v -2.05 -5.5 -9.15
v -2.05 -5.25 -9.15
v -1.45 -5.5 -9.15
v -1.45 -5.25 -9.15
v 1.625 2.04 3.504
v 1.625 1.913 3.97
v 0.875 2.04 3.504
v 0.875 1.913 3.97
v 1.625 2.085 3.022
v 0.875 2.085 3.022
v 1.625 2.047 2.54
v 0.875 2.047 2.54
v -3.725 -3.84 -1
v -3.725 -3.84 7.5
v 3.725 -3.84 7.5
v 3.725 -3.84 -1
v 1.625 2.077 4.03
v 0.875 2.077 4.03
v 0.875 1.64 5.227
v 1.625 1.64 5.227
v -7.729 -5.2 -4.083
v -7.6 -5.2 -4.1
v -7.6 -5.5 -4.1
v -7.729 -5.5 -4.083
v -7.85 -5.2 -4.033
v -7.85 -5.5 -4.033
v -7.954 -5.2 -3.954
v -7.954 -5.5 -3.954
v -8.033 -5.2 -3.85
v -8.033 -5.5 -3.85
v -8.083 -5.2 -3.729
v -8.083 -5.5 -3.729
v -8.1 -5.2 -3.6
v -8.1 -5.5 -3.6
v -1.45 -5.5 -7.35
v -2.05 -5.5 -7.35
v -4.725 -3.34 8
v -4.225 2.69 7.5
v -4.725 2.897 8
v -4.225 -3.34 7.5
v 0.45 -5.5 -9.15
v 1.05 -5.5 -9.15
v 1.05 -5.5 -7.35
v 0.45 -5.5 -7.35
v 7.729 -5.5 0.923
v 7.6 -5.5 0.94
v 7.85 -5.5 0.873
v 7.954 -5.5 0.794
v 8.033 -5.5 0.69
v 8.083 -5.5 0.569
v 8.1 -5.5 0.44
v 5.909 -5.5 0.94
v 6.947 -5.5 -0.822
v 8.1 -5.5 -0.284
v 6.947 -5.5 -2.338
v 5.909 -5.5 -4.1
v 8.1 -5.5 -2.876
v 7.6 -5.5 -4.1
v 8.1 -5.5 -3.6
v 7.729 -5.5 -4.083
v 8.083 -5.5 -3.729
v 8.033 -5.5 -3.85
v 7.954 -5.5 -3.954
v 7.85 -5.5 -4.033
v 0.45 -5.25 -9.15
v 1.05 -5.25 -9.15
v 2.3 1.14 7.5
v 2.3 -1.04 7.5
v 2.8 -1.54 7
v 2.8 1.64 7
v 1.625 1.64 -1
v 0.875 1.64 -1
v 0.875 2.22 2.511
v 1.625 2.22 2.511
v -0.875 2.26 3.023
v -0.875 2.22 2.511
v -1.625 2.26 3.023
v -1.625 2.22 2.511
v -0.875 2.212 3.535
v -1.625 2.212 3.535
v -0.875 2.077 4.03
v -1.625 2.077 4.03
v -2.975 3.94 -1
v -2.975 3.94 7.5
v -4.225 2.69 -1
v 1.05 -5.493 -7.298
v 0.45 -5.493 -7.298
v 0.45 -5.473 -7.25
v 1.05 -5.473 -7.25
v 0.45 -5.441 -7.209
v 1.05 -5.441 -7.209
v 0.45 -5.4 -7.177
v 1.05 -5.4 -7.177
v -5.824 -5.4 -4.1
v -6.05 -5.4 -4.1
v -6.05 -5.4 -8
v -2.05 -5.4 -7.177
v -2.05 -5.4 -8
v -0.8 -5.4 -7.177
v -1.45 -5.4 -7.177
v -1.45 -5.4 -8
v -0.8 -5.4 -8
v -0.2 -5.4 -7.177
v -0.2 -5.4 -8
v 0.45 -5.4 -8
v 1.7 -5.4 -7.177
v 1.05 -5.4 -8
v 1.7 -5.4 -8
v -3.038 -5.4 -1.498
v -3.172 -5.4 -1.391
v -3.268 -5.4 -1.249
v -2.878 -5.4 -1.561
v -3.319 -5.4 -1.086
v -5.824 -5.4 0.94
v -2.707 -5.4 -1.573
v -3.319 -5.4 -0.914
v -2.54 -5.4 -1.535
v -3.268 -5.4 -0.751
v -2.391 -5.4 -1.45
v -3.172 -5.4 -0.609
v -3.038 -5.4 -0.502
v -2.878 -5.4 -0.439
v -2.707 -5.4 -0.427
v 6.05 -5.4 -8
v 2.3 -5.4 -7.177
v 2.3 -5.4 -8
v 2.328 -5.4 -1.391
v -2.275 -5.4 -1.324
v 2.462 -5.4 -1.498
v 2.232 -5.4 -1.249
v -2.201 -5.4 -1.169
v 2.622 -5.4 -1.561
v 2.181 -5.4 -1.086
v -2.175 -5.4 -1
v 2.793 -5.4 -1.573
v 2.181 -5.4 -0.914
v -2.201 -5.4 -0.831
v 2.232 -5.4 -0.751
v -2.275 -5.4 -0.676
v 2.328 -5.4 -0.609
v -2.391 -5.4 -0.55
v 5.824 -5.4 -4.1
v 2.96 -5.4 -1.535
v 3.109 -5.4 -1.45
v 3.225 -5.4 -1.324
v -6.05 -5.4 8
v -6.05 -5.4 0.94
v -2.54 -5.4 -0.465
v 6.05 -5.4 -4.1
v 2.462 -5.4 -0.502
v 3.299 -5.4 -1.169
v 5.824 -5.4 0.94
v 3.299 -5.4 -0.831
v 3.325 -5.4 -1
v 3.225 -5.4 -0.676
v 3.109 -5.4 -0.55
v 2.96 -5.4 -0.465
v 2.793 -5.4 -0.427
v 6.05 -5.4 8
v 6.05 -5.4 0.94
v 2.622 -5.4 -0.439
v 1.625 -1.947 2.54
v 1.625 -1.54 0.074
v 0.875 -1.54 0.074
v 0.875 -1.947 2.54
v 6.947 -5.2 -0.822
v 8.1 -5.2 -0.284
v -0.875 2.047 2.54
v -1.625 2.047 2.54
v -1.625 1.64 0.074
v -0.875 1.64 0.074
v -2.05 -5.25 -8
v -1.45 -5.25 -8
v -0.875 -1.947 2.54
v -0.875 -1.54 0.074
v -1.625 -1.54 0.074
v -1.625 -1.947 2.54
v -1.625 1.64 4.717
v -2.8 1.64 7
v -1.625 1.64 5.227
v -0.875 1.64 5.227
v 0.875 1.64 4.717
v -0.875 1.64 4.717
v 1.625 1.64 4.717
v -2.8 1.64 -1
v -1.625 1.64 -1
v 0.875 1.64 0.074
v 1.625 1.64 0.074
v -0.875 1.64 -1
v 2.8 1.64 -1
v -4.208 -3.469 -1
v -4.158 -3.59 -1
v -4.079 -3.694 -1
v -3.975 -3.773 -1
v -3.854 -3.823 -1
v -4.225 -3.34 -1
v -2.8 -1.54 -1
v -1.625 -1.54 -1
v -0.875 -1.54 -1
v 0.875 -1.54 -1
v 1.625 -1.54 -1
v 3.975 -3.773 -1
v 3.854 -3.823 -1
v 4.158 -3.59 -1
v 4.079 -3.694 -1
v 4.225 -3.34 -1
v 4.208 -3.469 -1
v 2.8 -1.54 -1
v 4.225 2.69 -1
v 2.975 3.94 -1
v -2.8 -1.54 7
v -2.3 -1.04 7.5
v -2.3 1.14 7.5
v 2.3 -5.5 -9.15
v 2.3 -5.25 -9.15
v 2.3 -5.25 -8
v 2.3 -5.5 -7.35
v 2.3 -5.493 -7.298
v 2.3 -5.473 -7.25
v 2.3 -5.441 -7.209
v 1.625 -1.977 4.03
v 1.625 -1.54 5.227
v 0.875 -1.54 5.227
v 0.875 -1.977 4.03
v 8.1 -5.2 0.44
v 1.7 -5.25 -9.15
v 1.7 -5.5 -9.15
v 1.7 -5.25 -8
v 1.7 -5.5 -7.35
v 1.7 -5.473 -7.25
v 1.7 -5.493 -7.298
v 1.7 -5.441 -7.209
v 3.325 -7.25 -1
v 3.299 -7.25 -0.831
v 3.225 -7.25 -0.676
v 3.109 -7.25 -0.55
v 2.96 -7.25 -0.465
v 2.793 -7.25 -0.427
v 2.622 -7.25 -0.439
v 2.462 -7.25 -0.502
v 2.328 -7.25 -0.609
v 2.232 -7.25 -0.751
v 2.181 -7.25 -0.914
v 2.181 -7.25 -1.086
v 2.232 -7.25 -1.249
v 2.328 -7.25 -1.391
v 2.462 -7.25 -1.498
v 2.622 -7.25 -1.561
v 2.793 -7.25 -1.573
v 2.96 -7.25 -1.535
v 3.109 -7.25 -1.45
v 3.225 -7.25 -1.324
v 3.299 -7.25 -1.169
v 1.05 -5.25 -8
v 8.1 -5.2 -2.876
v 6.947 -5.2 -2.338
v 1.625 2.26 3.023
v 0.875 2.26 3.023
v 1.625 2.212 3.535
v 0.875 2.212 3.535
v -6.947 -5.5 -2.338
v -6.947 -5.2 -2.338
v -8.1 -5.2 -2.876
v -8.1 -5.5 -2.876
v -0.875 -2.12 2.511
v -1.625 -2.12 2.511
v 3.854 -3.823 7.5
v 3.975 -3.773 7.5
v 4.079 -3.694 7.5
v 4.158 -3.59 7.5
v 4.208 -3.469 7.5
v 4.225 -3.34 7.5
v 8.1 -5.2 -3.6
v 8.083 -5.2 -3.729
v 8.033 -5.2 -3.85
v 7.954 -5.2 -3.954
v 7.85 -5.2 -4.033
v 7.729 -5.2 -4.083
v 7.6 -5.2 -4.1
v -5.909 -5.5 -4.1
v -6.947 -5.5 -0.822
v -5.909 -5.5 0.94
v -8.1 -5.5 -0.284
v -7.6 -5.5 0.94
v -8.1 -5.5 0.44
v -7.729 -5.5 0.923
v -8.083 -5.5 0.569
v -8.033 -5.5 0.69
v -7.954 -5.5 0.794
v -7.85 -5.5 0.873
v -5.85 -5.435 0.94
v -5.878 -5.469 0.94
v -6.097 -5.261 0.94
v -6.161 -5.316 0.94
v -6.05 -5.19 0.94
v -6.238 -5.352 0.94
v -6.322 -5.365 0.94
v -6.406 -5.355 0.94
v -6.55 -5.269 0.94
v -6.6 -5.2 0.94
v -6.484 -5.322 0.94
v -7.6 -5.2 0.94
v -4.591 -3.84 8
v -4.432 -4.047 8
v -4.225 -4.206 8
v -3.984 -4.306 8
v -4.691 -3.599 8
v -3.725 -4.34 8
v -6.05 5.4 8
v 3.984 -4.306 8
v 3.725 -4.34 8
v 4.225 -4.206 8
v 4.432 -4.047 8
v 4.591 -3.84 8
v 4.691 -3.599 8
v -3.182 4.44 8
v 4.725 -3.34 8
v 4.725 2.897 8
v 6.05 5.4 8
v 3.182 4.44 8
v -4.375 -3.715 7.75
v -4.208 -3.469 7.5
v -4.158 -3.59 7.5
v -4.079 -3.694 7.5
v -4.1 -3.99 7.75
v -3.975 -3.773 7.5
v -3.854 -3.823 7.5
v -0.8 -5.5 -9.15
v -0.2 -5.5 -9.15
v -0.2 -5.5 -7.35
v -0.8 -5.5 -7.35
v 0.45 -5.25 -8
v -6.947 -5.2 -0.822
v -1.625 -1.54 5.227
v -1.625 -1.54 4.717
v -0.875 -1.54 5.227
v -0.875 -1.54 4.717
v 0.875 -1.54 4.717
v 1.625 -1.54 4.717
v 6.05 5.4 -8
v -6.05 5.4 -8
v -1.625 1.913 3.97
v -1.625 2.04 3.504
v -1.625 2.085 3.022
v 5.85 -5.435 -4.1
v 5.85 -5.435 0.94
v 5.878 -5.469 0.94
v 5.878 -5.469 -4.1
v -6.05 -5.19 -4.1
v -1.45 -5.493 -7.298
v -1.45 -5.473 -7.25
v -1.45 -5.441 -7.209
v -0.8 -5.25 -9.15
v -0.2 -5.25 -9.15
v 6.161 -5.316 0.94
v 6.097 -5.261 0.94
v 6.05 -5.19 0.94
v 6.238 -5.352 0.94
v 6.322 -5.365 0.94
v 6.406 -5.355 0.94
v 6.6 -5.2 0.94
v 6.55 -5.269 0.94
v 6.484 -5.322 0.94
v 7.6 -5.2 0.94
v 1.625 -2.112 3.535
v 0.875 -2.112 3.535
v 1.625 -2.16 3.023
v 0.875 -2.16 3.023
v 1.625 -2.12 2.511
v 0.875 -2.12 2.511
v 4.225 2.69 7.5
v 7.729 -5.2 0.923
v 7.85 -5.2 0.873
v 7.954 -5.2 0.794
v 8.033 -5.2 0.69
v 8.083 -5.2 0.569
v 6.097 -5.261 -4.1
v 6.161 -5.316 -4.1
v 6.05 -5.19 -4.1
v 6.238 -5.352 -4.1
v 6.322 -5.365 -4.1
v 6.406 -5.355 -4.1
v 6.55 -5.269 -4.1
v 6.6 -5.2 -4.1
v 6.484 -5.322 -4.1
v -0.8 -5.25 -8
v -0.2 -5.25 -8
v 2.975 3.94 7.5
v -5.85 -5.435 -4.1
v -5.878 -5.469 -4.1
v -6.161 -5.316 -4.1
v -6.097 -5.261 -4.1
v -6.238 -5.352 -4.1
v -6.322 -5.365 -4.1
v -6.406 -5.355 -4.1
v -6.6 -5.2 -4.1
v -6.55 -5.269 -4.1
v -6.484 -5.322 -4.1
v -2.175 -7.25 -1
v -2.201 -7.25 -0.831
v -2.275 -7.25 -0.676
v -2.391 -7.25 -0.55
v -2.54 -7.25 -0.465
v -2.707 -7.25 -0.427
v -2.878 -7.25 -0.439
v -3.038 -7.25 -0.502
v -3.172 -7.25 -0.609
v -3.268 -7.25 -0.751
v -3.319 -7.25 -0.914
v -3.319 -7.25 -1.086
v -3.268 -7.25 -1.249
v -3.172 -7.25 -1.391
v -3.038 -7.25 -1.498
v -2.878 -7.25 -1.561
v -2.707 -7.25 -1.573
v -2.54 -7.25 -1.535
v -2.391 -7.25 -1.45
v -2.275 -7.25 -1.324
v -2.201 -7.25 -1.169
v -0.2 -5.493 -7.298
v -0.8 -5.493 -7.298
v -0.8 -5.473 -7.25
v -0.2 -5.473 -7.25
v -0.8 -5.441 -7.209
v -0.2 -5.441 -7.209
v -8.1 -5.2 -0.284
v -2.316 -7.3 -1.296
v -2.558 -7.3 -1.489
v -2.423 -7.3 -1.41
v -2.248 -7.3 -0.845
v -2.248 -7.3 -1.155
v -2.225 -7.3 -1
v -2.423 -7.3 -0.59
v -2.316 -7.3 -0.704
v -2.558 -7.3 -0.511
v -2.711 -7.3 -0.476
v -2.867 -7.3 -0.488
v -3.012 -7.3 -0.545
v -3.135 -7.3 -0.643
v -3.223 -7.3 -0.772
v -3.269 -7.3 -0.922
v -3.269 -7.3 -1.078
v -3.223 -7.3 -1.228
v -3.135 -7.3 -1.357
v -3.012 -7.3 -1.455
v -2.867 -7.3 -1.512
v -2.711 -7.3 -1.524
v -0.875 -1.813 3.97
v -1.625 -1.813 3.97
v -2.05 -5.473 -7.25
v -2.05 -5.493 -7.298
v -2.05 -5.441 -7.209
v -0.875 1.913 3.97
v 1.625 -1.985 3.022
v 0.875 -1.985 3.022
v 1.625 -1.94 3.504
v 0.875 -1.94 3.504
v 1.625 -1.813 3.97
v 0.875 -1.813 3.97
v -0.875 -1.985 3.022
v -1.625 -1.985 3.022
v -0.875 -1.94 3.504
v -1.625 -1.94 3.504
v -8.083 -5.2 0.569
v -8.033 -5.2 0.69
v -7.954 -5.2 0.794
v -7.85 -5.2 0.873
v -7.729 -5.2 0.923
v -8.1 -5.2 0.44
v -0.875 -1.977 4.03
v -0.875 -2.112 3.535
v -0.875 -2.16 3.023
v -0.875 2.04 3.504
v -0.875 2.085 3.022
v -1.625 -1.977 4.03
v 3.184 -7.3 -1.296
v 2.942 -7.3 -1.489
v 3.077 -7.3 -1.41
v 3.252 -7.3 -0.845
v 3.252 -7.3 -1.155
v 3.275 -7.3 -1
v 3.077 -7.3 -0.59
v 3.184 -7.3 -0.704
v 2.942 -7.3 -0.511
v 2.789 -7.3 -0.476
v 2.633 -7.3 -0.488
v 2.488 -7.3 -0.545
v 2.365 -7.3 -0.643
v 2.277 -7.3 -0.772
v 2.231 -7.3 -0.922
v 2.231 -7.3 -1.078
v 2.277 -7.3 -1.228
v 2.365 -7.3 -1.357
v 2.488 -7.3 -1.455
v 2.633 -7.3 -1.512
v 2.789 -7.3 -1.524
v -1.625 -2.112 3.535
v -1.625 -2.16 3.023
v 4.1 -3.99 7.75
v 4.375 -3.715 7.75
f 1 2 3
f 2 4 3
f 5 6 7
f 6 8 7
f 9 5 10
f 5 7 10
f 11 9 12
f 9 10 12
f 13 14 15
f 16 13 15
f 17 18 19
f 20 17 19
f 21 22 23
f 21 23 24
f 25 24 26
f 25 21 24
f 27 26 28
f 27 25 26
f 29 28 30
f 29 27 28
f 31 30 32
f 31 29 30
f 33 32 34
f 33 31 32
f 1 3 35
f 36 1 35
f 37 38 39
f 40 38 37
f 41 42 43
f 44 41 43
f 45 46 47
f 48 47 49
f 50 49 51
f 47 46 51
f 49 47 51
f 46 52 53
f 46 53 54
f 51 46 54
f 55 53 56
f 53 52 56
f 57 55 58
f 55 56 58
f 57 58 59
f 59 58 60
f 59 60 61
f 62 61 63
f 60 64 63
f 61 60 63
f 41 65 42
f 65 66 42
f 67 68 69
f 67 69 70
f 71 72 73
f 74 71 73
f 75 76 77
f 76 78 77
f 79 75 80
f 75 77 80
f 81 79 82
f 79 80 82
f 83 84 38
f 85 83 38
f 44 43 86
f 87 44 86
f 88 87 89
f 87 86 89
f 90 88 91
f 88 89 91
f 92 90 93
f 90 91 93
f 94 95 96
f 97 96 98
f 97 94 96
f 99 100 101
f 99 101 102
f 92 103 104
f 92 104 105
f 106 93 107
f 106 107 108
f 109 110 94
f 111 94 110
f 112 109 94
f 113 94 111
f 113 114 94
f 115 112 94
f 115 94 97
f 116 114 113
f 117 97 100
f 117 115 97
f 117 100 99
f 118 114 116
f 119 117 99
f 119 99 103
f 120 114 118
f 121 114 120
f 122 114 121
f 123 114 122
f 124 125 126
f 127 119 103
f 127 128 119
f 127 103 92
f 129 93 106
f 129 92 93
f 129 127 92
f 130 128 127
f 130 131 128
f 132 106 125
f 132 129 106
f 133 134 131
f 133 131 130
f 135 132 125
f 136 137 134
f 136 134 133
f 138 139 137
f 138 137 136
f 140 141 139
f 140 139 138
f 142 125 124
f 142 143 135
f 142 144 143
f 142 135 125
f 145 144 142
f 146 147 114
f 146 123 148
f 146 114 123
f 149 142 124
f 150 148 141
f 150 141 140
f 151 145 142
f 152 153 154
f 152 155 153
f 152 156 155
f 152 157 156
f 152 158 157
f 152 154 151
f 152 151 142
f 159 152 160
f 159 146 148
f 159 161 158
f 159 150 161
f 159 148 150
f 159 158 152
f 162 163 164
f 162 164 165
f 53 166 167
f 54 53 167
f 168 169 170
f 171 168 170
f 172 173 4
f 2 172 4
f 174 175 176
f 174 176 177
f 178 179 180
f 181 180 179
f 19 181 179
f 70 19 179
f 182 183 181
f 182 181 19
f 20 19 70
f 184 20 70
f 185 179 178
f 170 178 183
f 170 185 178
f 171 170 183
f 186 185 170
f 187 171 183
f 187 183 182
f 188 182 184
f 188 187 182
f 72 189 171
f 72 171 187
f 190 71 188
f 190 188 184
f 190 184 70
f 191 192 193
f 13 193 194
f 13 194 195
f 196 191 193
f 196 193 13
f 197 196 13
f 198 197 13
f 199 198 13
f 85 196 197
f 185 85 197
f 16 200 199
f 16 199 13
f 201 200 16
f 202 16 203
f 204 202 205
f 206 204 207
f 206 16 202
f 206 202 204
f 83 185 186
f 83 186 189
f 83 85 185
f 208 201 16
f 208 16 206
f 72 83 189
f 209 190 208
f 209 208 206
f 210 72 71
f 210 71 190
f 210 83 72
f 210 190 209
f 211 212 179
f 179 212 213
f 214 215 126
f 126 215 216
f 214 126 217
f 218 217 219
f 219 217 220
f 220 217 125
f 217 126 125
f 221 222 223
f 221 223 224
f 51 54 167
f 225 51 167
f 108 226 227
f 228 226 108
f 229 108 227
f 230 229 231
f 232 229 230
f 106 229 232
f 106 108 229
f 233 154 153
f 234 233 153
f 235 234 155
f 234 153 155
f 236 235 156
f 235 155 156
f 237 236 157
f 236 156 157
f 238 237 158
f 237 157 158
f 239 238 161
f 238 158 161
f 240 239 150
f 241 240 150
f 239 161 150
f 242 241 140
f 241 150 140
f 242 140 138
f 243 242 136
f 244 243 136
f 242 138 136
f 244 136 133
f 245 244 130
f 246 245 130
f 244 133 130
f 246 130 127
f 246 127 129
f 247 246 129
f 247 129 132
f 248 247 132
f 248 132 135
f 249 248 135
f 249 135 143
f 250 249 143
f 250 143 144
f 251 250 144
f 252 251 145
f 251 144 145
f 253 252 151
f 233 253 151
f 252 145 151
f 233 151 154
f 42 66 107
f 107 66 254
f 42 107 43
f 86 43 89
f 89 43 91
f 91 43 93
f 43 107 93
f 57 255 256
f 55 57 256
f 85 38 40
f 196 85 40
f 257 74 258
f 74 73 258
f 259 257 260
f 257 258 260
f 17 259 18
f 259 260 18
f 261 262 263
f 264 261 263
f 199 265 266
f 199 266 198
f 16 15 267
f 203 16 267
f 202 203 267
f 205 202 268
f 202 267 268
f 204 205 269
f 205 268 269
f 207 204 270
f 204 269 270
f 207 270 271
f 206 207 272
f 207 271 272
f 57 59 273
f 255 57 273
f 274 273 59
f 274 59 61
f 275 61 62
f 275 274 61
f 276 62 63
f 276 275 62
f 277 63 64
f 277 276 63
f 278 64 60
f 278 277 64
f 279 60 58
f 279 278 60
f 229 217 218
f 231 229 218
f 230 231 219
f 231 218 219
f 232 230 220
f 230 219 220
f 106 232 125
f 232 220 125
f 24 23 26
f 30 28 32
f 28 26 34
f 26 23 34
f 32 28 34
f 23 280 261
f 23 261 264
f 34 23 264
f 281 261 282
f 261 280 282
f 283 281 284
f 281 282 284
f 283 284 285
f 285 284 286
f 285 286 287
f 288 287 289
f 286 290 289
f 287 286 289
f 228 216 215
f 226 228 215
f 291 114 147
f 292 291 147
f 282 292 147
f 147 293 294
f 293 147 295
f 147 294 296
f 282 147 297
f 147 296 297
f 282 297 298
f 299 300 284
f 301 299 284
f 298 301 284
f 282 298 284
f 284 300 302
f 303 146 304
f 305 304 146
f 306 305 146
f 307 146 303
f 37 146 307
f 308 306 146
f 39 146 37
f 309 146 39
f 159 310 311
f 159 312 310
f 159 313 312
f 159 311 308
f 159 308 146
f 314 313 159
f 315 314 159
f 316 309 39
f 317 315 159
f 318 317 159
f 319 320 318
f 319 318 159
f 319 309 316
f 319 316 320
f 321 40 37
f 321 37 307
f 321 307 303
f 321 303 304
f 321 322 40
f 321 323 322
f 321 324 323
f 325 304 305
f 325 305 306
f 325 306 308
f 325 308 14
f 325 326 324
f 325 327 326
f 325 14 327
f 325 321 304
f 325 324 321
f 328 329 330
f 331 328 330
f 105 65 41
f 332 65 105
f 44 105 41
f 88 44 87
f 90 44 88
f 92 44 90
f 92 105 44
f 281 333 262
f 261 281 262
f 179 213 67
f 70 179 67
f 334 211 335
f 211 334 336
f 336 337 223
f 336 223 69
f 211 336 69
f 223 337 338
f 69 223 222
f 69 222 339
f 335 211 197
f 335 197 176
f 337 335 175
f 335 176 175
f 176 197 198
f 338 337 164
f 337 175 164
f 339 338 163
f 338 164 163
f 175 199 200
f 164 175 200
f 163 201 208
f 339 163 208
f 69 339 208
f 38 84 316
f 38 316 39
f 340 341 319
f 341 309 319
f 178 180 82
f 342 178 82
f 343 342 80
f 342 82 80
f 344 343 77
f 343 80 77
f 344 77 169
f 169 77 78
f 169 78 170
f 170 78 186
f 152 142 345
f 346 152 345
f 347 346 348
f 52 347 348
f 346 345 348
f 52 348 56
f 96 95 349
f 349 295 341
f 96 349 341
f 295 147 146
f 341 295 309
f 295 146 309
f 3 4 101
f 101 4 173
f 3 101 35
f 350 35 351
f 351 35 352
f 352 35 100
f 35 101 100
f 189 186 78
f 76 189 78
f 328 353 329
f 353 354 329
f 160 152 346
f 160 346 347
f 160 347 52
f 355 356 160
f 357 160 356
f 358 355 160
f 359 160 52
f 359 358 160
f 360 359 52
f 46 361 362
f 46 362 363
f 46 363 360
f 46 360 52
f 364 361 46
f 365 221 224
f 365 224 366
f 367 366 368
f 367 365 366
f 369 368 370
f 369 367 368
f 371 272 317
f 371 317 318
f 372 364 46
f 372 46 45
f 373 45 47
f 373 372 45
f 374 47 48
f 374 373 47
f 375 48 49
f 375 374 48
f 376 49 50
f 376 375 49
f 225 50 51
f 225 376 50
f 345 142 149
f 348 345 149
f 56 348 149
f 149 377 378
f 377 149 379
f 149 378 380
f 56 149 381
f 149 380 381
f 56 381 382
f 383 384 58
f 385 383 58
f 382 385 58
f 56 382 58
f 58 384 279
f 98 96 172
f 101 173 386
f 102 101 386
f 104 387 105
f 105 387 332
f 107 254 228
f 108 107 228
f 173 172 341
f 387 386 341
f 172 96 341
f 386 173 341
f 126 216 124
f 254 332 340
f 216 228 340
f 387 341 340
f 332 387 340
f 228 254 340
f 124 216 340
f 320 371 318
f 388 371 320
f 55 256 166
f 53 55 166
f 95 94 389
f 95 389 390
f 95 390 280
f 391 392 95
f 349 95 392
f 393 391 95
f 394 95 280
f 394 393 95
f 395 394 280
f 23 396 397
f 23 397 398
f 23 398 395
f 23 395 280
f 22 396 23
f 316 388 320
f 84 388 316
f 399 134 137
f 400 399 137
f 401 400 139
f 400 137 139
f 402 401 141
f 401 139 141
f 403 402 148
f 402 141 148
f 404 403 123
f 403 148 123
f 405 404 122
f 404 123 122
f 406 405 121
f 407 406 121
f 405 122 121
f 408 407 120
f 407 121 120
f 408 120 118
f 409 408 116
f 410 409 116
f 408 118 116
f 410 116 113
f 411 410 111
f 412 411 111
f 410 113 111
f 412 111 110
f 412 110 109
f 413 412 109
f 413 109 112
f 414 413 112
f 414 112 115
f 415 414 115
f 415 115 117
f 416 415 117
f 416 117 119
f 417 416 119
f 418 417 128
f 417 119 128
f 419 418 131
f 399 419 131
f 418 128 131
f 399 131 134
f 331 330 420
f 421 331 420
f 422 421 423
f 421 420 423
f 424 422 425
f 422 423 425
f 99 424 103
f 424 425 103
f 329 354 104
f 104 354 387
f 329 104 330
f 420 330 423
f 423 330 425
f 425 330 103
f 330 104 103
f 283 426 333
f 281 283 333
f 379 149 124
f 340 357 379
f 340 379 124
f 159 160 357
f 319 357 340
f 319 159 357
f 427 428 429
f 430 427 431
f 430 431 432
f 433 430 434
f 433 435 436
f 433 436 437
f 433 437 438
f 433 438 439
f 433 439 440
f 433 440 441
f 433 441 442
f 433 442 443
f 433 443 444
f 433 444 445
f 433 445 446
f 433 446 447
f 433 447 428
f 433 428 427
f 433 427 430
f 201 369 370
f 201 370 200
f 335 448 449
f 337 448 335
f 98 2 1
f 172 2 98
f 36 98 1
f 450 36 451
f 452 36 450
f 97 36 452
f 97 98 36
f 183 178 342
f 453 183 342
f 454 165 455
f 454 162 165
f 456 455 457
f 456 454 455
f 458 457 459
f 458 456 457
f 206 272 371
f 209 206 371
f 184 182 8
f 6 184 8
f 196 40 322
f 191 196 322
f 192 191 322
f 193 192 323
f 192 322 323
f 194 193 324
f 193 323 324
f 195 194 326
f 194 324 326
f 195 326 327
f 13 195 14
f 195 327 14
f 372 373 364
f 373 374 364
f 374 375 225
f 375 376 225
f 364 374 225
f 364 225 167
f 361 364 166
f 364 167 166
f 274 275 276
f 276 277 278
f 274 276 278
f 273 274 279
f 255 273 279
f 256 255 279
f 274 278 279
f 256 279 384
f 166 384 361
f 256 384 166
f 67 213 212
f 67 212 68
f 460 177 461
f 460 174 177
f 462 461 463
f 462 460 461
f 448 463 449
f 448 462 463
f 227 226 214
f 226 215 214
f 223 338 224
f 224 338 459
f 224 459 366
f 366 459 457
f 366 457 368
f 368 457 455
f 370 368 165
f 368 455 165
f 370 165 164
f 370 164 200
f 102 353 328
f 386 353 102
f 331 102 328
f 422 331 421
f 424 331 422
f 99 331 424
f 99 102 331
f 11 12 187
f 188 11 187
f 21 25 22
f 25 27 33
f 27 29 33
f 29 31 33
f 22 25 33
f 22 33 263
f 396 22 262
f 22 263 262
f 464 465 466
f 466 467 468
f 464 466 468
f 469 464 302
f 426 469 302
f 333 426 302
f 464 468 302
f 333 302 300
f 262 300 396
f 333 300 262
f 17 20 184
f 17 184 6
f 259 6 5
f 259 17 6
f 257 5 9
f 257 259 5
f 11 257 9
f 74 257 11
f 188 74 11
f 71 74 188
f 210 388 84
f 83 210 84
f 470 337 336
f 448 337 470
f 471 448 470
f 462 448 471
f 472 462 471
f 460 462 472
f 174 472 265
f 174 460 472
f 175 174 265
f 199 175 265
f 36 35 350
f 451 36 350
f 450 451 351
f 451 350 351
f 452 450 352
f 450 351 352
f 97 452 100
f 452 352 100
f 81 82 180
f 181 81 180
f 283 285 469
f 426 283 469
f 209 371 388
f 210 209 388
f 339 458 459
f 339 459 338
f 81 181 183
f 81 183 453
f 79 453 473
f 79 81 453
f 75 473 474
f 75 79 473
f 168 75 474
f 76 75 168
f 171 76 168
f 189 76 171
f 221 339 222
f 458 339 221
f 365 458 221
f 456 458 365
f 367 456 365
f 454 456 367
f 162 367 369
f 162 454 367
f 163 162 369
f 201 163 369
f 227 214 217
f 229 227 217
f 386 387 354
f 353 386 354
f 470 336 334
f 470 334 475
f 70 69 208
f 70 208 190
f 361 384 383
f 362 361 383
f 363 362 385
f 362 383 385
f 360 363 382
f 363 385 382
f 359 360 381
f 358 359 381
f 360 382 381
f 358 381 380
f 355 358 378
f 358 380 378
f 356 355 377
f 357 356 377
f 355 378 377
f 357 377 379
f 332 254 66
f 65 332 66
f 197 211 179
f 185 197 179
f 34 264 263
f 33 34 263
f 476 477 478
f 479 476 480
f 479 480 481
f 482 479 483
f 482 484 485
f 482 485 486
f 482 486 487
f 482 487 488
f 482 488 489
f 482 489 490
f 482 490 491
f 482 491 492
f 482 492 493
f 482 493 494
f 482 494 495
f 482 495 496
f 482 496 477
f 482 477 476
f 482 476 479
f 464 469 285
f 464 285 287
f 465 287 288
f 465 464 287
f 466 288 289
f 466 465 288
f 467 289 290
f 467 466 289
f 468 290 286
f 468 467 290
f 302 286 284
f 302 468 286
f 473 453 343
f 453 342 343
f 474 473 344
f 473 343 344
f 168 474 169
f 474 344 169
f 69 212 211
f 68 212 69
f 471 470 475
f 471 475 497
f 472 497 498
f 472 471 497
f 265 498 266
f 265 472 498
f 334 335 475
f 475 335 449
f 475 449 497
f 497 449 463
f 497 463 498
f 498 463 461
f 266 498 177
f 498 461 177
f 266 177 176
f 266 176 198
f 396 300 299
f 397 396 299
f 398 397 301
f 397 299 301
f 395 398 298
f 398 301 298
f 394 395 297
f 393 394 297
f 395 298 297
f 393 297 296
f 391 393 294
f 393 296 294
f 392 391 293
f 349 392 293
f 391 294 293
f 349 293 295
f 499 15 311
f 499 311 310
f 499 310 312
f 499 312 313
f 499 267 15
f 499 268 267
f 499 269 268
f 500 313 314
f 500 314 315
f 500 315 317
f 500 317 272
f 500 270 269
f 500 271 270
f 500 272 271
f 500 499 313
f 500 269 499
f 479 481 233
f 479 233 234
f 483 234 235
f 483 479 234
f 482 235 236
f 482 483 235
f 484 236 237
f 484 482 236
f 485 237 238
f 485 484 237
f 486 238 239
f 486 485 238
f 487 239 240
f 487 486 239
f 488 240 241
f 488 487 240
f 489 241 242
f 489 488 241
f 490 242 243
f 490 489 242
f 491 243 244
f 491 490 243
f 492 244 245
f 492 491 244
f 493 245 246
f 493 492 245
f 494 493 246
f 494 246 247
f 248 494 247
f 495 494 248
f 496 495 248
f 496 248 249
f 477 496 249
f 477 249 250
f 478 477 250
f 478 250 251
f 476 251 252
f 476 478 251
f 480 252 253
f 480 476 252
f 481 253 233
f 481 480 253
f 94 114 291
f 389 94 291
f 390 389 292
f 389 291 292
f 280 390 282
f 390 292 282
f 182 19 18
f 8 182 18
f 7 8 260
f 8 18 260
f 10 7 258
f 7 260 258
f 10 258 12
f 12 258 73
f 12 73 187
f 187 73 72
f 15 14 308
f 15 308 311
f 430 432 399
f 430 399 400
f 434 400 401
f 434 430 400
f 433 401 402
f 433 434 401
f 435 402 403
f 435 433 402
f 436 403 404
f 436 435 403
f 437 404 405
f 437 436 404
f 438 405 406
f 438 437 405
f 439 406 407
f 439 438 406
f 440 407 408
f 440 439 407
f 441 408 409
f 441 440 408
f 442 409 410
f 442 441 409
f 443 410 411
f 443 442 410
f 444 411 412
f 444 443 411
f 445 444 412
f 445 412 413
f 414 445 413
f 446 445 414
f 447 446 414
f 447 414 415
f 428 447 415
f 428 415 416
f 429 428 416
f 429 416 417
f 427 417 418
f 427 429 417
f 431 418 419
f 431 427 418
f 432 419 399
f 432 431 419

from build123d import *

# Parameters (mm, degrees)
SKETCH1_W                    = 12.1
SKETCH1_H                    = 10.8
BASE_DEPTH                   = 8
CONTACT_OPENING_DEPTH        = 9
CONTACT_OPENING_LEAD_IN_SIZE = 0.5
SKETCH3_W                    = 5.6
SKETCH3_H                    = 3.18
CONTACT_AREA_DEPTH           = 8.5
CONTACT_AREA_LEAD_IN_SIZE    = 0.5
GROUND_LEGS_DEPTH            = 2.52
GROUND_LEGS_SHAPE_DEPTH      = 0.3
SM_TAILS_DEPTH               = 0.3
CONTACT_DEPTH                = 0.375
CONTACT_PATTERN_COUNT        = 2
CONTACT_PATTERN_PITCH        = 2.5
LPATTERN1_COUNT              = 2
LPATTERN1_PITCH              = 1.25
LPATTERN1_COL_COUNT          = 3
LPATTERN1_COL_PITCH          = 1.25
SKETCH12_R                   = 0.575
ALIGNMENT_PIN_DEPTH          = 1.9
PIN_POINT_SIZE               = 0.05


with BuildPart() as part:
    # Sketch1 → Base (new body, symmetric)
    with BuildSketch(Plane.XY):
        Rectangle(SKETCH1_W, SKETCH1_H)
    extrude(amount=BASE_DEPTH, both=True)

    # Sketch2 → Contact Opening (cut)
    with BuildSketch(Plane.XY.offset(8)):
        with BuildLine():
            Line((-2.975, 3.94), (-4.225, 2.69))
            Line((-4.225, 2.69), (-4.225, -3.34))
            ThreePointArc((-4.225, -3.34), (-4.078553391, -3.693553391), (-3.725, -3.84))
            Line((-3.725, -3.84), (3.725, -3.84))
            ThreePointArc((3.725, -3.84), (4.078553391, -3.693553391), (4.225, -3.34))
            Line((4.225, -3.34), (4.225, 2.69))
            Line((4.225, 2.69), (2.975, 3.94))
            Line((2.975, 3.94), (-2.975, 3.94))
        make_face()
    extrude(amount=-CONTACT_OPENING_DEPTH, mode=Mode.SUBTRACT)

    # Contact Opening Lead-in
    contact_opening_lead_in_edges = [part.edges().sort_by_distance(p)[0] for p in [
        (0, 3.94, 8),
        (-3.6, 3.315, 8),
        (-4.225, -0.325, 8),
        (-4.078553391, -3.693553391, 8),
        (0, -3.84, 8),
        (4.078553391, -3.693553391, 8),
        (4.225, -0.325, 8),
        (3.6, 3.315, 8),
    ]]
    chamfer(contact_opening_lead_in_edges, length=CONTACT_OPENING_LEAD_IN_SIZE)

    # Sketch3 → Contact Area (add)
    with BuildSketch(Plane.XY.offset(-1)):
        with Locations((0, 0.05)):
            Rectangle(SKETCH3_W, SKETCH3_H)
    extrude(amount=CONTACT_AREA_DEPTH)

    # Contact Area Lead-in
    contact_area_lead_in_edges = [part.edges().sort_by_distance(p)[0] for p in [
        (-2.8, 0.05, 7.5),
        (0, -1.54, 7.5),
        (2.8, 0.05, 7.5),
        (0, 1.64, 7.5),
    ]]
    chamfer(contact_area_lead_in_edges, length=CONTACT_AREA_LEAD_IN_SIZE)

    # Sketch4 → Ground Legs (add, symmetric)
    with BuildSketch(Plane.XY.offset(-1.58)):
        with BuildLine():
            Line((6.02, -5.058034034), (5.72, -5.100661668))
            ThreePointArc((5.72, -5.100661668), (5.776842077, -5.318050295), (5.90868722, -5.5))
            Line((5.90868722, -5.5), (8.1, -5.5))
            Line((8.1, -5.5), (8.1, -5.2))
            Line((8.1, -5.2), (6.599504335, -5.2))
            ThreePointArc((6.599504335, -5.2), (6.254059507, -5.356354169), (6.02, -5.058034034))
        make_face()
        with BuildLine():
            Line((-5.90868722, -5.5), (-8.1, -5.5))
            Line((-8.1, -5.5), (-8.1, -5.2))
            Line((-8.1, -5.2), (-6.599504335, -5.2))
            ThreePointArc((-6.599504335, -5.2), (-6.254059507, -5.356354169), (-6.02, -5.058034034))
            Line((-6.02, -5.058034034), (-5.72, -5.100661668))
            ThreePointArc((-5.72, -5.100661668), (-5.776842077, -5.318050295), (-5.90868722, -5.5))
        make_face()
    extrude(amount=GROUND_LEGS_DEPTH, both=True)

    # Sketch9 → ground legs shape (cut)
    with BuildSketch(Plane(origin=(0, -5.2, 0), x_dir=(-1, 0, 0), z_dir=(0, 1, 0))):
        with BuildLine():
            Line((-8.1, -4.1), (-8.1, -3.6))
            ThreePointArc((-8.1, -3.6), (-7.953553391, -3.953553391), (-7.6, -4.1))
            Line((-7.6, -4.1), (-8.1, -4.1))
        make_face()
        Polygon((-8.1, -2.875946044), (-6.946732983, -2.33830257), (-6.946732983, -0.82169743), (-8.1, -0.284053956), align=None)
        with BuildLine():
            Line((-8.1, 0.94), (-7.6, 0.94))
            ThreePointArc((-7.6, 0.94), (-7.953553391, 0.793553391), (-8.1, 0.44))
            Line((-8.1, 0.44), (-8.1, 0.94))
        make_face()
        with BuildLine():
            Line((8.1, 0.94), (8.1, 0.44))
            ThreePointArc((8.1, 0.44), (7.953553391, 0.793553391), (7.6, 0.94))
            Line((7.6, 0.94), (8.1, 0.94))
        make_face()
        Polygon((8.1, -0.284053956), (6.946732983, -0.82169743), (6.946732983, -2.33830257), (8.1, -2.875946044), align=None)
        with BuildLine():
            Line((8.1, -4.1), (7.6, -4.1))
            ThreePointArc((7.6, -4.1), (7.953553391, -3.953553391), (8.1, -3.6))
            Line((8.1, -3.6), (8.1, -4.1))
        make_face()
    extrude(amount=-GROUND_LEGS_SHAPE_DEPTH, mode=Mode.SUBTRACT)

    # Sketch11 → SM Tails (add, symmetric)
    with BuildSketch(Plane(origin=(0.75, 0, 0), x_dir=(0, 0, -1), z_dir=(1, 0, 0))):
        with BuildLine():
            Line((7.15, -5.3), (7.15, -5.15))
            Line((7.15, -5.15), (7.4, -5.15))
            ThreePointArc((7.4, -5.15), (7.429289322, -5.220710678), (7.5, -5.25))
            Line((7.5, -5.25), (9.15, -5.25))
            Line((9.15, -5.25), (9.15, -5.5))
            Line((9.15, -5.5), (7.35, -5.5))
            ThreePointArc((7.35, -5.5), (7.208578644, -5.441421356), (7.15, -5.3))
        make_face()
    sm_tails = extrude(amount=SM_TAILS_DEPTH, both=True)

    # Sketch8 → Contact (add, symmetric)
    with BuildSketch(Plane(origin=(-1.25, 0, 0), x_dir=(0, 0, -1), z_dir=(1, 0, 0))):
        with BuildLine():
            Line((1, 1.64), (-2.511141434, 2.21990157))
            ThreePointArc((-2.511141434, 2.21990157), (-3.280012008, 2.246903627), (-4.030467404, 2.077469952))
            Line((-4.030467404, 2.077469952), (-5.5, 1.54))
            Line((-5.5, 1.54), (-5.439889401, 1.375647586))
            Line((-5.439889401, 1.375647586), (-3.970356805, 1.913117538))
            ThreePointArc((-3.970356805, 1.913117538), (-3.263677974, 2.072667582), (-2.539658184, 2.047240645))
            Line((-2.539658184, 2.047240645), (0.97148325, 1.467339075))
            Line((0.97148325, 1.467339075), (1, 1.64))
        make_face()
        with BuildLine():
            Line((-5.439889401, -1.275647586), (-5.5, -1.44))
            Line((-5.5, -1.44), (-4.030467404, -1.977469952))
            ThreePointArc((-4.030467404, -1.977469952), (-3.280012008, -2.146903627), (-2.511141434, -2.11990157))
            Line((-2.511141434, -2.11990157), (1, -1.54))
            Line((1, -1.54), (0.97148325, -1.367339075))
            Line((0.97148325, -1.367339075), (-2.539658184, -1.947240645))
            ThreePointArc((-2.539658184, -1.947240645), (-3.263677974, -1.972667582), (-3.970356805, -1.813117538))
            Line((-3.970356805, -1.813117538), (-5.439889401, -1.275647586))
        make_face()
    contact = extrude(amount=CONTACT_DEPTH, both=True)

    # Contact Pattern: Contact ×2
    with Locations(*[(i * CONTACT_PATTERN_PITCH, 0, 0) for i in range(1, CONTACT_PATTERN_COUNT)]):
        add(contact)

    # LPattern1: SM Tails ×2
    with Locations(*[(i * LPATTERN1_PITCH, 0, 0) for i in range(1, LPATTERN1_COUNT)]):
        add(sm_tails)

    # LPattern1 col: SM Tails ×3
    with Locations(*[(-i * LPATTERN1_COL_PITCH, 0, 0) for i in range(1, LPATTERN1_COL_COUNT)]):
        add(sm_tails)

    # Sketch12 → Alignment Pin (add)
    with BuildSketch(Plane.XZ.offset(5.4)):
        with Locations((2.75, -1)):
            Circle(SKETCH12_R)
        with Locations((-2.75, -1)):
            Circle(SKETCH12_R)
    extrude(amount=ALIGNMENT_PIN_DEPTH)

    # Pin Point
    pin_point_edges = [part.edges().sort_by_distance(p)[0] for p in [
        (2.175, -7.3, -1),
        (-3.325, -7.3, -1),
    ]]
    chamfer(pin_point_edges, length=PIN_POINT_SIZE)


solid = part.part
